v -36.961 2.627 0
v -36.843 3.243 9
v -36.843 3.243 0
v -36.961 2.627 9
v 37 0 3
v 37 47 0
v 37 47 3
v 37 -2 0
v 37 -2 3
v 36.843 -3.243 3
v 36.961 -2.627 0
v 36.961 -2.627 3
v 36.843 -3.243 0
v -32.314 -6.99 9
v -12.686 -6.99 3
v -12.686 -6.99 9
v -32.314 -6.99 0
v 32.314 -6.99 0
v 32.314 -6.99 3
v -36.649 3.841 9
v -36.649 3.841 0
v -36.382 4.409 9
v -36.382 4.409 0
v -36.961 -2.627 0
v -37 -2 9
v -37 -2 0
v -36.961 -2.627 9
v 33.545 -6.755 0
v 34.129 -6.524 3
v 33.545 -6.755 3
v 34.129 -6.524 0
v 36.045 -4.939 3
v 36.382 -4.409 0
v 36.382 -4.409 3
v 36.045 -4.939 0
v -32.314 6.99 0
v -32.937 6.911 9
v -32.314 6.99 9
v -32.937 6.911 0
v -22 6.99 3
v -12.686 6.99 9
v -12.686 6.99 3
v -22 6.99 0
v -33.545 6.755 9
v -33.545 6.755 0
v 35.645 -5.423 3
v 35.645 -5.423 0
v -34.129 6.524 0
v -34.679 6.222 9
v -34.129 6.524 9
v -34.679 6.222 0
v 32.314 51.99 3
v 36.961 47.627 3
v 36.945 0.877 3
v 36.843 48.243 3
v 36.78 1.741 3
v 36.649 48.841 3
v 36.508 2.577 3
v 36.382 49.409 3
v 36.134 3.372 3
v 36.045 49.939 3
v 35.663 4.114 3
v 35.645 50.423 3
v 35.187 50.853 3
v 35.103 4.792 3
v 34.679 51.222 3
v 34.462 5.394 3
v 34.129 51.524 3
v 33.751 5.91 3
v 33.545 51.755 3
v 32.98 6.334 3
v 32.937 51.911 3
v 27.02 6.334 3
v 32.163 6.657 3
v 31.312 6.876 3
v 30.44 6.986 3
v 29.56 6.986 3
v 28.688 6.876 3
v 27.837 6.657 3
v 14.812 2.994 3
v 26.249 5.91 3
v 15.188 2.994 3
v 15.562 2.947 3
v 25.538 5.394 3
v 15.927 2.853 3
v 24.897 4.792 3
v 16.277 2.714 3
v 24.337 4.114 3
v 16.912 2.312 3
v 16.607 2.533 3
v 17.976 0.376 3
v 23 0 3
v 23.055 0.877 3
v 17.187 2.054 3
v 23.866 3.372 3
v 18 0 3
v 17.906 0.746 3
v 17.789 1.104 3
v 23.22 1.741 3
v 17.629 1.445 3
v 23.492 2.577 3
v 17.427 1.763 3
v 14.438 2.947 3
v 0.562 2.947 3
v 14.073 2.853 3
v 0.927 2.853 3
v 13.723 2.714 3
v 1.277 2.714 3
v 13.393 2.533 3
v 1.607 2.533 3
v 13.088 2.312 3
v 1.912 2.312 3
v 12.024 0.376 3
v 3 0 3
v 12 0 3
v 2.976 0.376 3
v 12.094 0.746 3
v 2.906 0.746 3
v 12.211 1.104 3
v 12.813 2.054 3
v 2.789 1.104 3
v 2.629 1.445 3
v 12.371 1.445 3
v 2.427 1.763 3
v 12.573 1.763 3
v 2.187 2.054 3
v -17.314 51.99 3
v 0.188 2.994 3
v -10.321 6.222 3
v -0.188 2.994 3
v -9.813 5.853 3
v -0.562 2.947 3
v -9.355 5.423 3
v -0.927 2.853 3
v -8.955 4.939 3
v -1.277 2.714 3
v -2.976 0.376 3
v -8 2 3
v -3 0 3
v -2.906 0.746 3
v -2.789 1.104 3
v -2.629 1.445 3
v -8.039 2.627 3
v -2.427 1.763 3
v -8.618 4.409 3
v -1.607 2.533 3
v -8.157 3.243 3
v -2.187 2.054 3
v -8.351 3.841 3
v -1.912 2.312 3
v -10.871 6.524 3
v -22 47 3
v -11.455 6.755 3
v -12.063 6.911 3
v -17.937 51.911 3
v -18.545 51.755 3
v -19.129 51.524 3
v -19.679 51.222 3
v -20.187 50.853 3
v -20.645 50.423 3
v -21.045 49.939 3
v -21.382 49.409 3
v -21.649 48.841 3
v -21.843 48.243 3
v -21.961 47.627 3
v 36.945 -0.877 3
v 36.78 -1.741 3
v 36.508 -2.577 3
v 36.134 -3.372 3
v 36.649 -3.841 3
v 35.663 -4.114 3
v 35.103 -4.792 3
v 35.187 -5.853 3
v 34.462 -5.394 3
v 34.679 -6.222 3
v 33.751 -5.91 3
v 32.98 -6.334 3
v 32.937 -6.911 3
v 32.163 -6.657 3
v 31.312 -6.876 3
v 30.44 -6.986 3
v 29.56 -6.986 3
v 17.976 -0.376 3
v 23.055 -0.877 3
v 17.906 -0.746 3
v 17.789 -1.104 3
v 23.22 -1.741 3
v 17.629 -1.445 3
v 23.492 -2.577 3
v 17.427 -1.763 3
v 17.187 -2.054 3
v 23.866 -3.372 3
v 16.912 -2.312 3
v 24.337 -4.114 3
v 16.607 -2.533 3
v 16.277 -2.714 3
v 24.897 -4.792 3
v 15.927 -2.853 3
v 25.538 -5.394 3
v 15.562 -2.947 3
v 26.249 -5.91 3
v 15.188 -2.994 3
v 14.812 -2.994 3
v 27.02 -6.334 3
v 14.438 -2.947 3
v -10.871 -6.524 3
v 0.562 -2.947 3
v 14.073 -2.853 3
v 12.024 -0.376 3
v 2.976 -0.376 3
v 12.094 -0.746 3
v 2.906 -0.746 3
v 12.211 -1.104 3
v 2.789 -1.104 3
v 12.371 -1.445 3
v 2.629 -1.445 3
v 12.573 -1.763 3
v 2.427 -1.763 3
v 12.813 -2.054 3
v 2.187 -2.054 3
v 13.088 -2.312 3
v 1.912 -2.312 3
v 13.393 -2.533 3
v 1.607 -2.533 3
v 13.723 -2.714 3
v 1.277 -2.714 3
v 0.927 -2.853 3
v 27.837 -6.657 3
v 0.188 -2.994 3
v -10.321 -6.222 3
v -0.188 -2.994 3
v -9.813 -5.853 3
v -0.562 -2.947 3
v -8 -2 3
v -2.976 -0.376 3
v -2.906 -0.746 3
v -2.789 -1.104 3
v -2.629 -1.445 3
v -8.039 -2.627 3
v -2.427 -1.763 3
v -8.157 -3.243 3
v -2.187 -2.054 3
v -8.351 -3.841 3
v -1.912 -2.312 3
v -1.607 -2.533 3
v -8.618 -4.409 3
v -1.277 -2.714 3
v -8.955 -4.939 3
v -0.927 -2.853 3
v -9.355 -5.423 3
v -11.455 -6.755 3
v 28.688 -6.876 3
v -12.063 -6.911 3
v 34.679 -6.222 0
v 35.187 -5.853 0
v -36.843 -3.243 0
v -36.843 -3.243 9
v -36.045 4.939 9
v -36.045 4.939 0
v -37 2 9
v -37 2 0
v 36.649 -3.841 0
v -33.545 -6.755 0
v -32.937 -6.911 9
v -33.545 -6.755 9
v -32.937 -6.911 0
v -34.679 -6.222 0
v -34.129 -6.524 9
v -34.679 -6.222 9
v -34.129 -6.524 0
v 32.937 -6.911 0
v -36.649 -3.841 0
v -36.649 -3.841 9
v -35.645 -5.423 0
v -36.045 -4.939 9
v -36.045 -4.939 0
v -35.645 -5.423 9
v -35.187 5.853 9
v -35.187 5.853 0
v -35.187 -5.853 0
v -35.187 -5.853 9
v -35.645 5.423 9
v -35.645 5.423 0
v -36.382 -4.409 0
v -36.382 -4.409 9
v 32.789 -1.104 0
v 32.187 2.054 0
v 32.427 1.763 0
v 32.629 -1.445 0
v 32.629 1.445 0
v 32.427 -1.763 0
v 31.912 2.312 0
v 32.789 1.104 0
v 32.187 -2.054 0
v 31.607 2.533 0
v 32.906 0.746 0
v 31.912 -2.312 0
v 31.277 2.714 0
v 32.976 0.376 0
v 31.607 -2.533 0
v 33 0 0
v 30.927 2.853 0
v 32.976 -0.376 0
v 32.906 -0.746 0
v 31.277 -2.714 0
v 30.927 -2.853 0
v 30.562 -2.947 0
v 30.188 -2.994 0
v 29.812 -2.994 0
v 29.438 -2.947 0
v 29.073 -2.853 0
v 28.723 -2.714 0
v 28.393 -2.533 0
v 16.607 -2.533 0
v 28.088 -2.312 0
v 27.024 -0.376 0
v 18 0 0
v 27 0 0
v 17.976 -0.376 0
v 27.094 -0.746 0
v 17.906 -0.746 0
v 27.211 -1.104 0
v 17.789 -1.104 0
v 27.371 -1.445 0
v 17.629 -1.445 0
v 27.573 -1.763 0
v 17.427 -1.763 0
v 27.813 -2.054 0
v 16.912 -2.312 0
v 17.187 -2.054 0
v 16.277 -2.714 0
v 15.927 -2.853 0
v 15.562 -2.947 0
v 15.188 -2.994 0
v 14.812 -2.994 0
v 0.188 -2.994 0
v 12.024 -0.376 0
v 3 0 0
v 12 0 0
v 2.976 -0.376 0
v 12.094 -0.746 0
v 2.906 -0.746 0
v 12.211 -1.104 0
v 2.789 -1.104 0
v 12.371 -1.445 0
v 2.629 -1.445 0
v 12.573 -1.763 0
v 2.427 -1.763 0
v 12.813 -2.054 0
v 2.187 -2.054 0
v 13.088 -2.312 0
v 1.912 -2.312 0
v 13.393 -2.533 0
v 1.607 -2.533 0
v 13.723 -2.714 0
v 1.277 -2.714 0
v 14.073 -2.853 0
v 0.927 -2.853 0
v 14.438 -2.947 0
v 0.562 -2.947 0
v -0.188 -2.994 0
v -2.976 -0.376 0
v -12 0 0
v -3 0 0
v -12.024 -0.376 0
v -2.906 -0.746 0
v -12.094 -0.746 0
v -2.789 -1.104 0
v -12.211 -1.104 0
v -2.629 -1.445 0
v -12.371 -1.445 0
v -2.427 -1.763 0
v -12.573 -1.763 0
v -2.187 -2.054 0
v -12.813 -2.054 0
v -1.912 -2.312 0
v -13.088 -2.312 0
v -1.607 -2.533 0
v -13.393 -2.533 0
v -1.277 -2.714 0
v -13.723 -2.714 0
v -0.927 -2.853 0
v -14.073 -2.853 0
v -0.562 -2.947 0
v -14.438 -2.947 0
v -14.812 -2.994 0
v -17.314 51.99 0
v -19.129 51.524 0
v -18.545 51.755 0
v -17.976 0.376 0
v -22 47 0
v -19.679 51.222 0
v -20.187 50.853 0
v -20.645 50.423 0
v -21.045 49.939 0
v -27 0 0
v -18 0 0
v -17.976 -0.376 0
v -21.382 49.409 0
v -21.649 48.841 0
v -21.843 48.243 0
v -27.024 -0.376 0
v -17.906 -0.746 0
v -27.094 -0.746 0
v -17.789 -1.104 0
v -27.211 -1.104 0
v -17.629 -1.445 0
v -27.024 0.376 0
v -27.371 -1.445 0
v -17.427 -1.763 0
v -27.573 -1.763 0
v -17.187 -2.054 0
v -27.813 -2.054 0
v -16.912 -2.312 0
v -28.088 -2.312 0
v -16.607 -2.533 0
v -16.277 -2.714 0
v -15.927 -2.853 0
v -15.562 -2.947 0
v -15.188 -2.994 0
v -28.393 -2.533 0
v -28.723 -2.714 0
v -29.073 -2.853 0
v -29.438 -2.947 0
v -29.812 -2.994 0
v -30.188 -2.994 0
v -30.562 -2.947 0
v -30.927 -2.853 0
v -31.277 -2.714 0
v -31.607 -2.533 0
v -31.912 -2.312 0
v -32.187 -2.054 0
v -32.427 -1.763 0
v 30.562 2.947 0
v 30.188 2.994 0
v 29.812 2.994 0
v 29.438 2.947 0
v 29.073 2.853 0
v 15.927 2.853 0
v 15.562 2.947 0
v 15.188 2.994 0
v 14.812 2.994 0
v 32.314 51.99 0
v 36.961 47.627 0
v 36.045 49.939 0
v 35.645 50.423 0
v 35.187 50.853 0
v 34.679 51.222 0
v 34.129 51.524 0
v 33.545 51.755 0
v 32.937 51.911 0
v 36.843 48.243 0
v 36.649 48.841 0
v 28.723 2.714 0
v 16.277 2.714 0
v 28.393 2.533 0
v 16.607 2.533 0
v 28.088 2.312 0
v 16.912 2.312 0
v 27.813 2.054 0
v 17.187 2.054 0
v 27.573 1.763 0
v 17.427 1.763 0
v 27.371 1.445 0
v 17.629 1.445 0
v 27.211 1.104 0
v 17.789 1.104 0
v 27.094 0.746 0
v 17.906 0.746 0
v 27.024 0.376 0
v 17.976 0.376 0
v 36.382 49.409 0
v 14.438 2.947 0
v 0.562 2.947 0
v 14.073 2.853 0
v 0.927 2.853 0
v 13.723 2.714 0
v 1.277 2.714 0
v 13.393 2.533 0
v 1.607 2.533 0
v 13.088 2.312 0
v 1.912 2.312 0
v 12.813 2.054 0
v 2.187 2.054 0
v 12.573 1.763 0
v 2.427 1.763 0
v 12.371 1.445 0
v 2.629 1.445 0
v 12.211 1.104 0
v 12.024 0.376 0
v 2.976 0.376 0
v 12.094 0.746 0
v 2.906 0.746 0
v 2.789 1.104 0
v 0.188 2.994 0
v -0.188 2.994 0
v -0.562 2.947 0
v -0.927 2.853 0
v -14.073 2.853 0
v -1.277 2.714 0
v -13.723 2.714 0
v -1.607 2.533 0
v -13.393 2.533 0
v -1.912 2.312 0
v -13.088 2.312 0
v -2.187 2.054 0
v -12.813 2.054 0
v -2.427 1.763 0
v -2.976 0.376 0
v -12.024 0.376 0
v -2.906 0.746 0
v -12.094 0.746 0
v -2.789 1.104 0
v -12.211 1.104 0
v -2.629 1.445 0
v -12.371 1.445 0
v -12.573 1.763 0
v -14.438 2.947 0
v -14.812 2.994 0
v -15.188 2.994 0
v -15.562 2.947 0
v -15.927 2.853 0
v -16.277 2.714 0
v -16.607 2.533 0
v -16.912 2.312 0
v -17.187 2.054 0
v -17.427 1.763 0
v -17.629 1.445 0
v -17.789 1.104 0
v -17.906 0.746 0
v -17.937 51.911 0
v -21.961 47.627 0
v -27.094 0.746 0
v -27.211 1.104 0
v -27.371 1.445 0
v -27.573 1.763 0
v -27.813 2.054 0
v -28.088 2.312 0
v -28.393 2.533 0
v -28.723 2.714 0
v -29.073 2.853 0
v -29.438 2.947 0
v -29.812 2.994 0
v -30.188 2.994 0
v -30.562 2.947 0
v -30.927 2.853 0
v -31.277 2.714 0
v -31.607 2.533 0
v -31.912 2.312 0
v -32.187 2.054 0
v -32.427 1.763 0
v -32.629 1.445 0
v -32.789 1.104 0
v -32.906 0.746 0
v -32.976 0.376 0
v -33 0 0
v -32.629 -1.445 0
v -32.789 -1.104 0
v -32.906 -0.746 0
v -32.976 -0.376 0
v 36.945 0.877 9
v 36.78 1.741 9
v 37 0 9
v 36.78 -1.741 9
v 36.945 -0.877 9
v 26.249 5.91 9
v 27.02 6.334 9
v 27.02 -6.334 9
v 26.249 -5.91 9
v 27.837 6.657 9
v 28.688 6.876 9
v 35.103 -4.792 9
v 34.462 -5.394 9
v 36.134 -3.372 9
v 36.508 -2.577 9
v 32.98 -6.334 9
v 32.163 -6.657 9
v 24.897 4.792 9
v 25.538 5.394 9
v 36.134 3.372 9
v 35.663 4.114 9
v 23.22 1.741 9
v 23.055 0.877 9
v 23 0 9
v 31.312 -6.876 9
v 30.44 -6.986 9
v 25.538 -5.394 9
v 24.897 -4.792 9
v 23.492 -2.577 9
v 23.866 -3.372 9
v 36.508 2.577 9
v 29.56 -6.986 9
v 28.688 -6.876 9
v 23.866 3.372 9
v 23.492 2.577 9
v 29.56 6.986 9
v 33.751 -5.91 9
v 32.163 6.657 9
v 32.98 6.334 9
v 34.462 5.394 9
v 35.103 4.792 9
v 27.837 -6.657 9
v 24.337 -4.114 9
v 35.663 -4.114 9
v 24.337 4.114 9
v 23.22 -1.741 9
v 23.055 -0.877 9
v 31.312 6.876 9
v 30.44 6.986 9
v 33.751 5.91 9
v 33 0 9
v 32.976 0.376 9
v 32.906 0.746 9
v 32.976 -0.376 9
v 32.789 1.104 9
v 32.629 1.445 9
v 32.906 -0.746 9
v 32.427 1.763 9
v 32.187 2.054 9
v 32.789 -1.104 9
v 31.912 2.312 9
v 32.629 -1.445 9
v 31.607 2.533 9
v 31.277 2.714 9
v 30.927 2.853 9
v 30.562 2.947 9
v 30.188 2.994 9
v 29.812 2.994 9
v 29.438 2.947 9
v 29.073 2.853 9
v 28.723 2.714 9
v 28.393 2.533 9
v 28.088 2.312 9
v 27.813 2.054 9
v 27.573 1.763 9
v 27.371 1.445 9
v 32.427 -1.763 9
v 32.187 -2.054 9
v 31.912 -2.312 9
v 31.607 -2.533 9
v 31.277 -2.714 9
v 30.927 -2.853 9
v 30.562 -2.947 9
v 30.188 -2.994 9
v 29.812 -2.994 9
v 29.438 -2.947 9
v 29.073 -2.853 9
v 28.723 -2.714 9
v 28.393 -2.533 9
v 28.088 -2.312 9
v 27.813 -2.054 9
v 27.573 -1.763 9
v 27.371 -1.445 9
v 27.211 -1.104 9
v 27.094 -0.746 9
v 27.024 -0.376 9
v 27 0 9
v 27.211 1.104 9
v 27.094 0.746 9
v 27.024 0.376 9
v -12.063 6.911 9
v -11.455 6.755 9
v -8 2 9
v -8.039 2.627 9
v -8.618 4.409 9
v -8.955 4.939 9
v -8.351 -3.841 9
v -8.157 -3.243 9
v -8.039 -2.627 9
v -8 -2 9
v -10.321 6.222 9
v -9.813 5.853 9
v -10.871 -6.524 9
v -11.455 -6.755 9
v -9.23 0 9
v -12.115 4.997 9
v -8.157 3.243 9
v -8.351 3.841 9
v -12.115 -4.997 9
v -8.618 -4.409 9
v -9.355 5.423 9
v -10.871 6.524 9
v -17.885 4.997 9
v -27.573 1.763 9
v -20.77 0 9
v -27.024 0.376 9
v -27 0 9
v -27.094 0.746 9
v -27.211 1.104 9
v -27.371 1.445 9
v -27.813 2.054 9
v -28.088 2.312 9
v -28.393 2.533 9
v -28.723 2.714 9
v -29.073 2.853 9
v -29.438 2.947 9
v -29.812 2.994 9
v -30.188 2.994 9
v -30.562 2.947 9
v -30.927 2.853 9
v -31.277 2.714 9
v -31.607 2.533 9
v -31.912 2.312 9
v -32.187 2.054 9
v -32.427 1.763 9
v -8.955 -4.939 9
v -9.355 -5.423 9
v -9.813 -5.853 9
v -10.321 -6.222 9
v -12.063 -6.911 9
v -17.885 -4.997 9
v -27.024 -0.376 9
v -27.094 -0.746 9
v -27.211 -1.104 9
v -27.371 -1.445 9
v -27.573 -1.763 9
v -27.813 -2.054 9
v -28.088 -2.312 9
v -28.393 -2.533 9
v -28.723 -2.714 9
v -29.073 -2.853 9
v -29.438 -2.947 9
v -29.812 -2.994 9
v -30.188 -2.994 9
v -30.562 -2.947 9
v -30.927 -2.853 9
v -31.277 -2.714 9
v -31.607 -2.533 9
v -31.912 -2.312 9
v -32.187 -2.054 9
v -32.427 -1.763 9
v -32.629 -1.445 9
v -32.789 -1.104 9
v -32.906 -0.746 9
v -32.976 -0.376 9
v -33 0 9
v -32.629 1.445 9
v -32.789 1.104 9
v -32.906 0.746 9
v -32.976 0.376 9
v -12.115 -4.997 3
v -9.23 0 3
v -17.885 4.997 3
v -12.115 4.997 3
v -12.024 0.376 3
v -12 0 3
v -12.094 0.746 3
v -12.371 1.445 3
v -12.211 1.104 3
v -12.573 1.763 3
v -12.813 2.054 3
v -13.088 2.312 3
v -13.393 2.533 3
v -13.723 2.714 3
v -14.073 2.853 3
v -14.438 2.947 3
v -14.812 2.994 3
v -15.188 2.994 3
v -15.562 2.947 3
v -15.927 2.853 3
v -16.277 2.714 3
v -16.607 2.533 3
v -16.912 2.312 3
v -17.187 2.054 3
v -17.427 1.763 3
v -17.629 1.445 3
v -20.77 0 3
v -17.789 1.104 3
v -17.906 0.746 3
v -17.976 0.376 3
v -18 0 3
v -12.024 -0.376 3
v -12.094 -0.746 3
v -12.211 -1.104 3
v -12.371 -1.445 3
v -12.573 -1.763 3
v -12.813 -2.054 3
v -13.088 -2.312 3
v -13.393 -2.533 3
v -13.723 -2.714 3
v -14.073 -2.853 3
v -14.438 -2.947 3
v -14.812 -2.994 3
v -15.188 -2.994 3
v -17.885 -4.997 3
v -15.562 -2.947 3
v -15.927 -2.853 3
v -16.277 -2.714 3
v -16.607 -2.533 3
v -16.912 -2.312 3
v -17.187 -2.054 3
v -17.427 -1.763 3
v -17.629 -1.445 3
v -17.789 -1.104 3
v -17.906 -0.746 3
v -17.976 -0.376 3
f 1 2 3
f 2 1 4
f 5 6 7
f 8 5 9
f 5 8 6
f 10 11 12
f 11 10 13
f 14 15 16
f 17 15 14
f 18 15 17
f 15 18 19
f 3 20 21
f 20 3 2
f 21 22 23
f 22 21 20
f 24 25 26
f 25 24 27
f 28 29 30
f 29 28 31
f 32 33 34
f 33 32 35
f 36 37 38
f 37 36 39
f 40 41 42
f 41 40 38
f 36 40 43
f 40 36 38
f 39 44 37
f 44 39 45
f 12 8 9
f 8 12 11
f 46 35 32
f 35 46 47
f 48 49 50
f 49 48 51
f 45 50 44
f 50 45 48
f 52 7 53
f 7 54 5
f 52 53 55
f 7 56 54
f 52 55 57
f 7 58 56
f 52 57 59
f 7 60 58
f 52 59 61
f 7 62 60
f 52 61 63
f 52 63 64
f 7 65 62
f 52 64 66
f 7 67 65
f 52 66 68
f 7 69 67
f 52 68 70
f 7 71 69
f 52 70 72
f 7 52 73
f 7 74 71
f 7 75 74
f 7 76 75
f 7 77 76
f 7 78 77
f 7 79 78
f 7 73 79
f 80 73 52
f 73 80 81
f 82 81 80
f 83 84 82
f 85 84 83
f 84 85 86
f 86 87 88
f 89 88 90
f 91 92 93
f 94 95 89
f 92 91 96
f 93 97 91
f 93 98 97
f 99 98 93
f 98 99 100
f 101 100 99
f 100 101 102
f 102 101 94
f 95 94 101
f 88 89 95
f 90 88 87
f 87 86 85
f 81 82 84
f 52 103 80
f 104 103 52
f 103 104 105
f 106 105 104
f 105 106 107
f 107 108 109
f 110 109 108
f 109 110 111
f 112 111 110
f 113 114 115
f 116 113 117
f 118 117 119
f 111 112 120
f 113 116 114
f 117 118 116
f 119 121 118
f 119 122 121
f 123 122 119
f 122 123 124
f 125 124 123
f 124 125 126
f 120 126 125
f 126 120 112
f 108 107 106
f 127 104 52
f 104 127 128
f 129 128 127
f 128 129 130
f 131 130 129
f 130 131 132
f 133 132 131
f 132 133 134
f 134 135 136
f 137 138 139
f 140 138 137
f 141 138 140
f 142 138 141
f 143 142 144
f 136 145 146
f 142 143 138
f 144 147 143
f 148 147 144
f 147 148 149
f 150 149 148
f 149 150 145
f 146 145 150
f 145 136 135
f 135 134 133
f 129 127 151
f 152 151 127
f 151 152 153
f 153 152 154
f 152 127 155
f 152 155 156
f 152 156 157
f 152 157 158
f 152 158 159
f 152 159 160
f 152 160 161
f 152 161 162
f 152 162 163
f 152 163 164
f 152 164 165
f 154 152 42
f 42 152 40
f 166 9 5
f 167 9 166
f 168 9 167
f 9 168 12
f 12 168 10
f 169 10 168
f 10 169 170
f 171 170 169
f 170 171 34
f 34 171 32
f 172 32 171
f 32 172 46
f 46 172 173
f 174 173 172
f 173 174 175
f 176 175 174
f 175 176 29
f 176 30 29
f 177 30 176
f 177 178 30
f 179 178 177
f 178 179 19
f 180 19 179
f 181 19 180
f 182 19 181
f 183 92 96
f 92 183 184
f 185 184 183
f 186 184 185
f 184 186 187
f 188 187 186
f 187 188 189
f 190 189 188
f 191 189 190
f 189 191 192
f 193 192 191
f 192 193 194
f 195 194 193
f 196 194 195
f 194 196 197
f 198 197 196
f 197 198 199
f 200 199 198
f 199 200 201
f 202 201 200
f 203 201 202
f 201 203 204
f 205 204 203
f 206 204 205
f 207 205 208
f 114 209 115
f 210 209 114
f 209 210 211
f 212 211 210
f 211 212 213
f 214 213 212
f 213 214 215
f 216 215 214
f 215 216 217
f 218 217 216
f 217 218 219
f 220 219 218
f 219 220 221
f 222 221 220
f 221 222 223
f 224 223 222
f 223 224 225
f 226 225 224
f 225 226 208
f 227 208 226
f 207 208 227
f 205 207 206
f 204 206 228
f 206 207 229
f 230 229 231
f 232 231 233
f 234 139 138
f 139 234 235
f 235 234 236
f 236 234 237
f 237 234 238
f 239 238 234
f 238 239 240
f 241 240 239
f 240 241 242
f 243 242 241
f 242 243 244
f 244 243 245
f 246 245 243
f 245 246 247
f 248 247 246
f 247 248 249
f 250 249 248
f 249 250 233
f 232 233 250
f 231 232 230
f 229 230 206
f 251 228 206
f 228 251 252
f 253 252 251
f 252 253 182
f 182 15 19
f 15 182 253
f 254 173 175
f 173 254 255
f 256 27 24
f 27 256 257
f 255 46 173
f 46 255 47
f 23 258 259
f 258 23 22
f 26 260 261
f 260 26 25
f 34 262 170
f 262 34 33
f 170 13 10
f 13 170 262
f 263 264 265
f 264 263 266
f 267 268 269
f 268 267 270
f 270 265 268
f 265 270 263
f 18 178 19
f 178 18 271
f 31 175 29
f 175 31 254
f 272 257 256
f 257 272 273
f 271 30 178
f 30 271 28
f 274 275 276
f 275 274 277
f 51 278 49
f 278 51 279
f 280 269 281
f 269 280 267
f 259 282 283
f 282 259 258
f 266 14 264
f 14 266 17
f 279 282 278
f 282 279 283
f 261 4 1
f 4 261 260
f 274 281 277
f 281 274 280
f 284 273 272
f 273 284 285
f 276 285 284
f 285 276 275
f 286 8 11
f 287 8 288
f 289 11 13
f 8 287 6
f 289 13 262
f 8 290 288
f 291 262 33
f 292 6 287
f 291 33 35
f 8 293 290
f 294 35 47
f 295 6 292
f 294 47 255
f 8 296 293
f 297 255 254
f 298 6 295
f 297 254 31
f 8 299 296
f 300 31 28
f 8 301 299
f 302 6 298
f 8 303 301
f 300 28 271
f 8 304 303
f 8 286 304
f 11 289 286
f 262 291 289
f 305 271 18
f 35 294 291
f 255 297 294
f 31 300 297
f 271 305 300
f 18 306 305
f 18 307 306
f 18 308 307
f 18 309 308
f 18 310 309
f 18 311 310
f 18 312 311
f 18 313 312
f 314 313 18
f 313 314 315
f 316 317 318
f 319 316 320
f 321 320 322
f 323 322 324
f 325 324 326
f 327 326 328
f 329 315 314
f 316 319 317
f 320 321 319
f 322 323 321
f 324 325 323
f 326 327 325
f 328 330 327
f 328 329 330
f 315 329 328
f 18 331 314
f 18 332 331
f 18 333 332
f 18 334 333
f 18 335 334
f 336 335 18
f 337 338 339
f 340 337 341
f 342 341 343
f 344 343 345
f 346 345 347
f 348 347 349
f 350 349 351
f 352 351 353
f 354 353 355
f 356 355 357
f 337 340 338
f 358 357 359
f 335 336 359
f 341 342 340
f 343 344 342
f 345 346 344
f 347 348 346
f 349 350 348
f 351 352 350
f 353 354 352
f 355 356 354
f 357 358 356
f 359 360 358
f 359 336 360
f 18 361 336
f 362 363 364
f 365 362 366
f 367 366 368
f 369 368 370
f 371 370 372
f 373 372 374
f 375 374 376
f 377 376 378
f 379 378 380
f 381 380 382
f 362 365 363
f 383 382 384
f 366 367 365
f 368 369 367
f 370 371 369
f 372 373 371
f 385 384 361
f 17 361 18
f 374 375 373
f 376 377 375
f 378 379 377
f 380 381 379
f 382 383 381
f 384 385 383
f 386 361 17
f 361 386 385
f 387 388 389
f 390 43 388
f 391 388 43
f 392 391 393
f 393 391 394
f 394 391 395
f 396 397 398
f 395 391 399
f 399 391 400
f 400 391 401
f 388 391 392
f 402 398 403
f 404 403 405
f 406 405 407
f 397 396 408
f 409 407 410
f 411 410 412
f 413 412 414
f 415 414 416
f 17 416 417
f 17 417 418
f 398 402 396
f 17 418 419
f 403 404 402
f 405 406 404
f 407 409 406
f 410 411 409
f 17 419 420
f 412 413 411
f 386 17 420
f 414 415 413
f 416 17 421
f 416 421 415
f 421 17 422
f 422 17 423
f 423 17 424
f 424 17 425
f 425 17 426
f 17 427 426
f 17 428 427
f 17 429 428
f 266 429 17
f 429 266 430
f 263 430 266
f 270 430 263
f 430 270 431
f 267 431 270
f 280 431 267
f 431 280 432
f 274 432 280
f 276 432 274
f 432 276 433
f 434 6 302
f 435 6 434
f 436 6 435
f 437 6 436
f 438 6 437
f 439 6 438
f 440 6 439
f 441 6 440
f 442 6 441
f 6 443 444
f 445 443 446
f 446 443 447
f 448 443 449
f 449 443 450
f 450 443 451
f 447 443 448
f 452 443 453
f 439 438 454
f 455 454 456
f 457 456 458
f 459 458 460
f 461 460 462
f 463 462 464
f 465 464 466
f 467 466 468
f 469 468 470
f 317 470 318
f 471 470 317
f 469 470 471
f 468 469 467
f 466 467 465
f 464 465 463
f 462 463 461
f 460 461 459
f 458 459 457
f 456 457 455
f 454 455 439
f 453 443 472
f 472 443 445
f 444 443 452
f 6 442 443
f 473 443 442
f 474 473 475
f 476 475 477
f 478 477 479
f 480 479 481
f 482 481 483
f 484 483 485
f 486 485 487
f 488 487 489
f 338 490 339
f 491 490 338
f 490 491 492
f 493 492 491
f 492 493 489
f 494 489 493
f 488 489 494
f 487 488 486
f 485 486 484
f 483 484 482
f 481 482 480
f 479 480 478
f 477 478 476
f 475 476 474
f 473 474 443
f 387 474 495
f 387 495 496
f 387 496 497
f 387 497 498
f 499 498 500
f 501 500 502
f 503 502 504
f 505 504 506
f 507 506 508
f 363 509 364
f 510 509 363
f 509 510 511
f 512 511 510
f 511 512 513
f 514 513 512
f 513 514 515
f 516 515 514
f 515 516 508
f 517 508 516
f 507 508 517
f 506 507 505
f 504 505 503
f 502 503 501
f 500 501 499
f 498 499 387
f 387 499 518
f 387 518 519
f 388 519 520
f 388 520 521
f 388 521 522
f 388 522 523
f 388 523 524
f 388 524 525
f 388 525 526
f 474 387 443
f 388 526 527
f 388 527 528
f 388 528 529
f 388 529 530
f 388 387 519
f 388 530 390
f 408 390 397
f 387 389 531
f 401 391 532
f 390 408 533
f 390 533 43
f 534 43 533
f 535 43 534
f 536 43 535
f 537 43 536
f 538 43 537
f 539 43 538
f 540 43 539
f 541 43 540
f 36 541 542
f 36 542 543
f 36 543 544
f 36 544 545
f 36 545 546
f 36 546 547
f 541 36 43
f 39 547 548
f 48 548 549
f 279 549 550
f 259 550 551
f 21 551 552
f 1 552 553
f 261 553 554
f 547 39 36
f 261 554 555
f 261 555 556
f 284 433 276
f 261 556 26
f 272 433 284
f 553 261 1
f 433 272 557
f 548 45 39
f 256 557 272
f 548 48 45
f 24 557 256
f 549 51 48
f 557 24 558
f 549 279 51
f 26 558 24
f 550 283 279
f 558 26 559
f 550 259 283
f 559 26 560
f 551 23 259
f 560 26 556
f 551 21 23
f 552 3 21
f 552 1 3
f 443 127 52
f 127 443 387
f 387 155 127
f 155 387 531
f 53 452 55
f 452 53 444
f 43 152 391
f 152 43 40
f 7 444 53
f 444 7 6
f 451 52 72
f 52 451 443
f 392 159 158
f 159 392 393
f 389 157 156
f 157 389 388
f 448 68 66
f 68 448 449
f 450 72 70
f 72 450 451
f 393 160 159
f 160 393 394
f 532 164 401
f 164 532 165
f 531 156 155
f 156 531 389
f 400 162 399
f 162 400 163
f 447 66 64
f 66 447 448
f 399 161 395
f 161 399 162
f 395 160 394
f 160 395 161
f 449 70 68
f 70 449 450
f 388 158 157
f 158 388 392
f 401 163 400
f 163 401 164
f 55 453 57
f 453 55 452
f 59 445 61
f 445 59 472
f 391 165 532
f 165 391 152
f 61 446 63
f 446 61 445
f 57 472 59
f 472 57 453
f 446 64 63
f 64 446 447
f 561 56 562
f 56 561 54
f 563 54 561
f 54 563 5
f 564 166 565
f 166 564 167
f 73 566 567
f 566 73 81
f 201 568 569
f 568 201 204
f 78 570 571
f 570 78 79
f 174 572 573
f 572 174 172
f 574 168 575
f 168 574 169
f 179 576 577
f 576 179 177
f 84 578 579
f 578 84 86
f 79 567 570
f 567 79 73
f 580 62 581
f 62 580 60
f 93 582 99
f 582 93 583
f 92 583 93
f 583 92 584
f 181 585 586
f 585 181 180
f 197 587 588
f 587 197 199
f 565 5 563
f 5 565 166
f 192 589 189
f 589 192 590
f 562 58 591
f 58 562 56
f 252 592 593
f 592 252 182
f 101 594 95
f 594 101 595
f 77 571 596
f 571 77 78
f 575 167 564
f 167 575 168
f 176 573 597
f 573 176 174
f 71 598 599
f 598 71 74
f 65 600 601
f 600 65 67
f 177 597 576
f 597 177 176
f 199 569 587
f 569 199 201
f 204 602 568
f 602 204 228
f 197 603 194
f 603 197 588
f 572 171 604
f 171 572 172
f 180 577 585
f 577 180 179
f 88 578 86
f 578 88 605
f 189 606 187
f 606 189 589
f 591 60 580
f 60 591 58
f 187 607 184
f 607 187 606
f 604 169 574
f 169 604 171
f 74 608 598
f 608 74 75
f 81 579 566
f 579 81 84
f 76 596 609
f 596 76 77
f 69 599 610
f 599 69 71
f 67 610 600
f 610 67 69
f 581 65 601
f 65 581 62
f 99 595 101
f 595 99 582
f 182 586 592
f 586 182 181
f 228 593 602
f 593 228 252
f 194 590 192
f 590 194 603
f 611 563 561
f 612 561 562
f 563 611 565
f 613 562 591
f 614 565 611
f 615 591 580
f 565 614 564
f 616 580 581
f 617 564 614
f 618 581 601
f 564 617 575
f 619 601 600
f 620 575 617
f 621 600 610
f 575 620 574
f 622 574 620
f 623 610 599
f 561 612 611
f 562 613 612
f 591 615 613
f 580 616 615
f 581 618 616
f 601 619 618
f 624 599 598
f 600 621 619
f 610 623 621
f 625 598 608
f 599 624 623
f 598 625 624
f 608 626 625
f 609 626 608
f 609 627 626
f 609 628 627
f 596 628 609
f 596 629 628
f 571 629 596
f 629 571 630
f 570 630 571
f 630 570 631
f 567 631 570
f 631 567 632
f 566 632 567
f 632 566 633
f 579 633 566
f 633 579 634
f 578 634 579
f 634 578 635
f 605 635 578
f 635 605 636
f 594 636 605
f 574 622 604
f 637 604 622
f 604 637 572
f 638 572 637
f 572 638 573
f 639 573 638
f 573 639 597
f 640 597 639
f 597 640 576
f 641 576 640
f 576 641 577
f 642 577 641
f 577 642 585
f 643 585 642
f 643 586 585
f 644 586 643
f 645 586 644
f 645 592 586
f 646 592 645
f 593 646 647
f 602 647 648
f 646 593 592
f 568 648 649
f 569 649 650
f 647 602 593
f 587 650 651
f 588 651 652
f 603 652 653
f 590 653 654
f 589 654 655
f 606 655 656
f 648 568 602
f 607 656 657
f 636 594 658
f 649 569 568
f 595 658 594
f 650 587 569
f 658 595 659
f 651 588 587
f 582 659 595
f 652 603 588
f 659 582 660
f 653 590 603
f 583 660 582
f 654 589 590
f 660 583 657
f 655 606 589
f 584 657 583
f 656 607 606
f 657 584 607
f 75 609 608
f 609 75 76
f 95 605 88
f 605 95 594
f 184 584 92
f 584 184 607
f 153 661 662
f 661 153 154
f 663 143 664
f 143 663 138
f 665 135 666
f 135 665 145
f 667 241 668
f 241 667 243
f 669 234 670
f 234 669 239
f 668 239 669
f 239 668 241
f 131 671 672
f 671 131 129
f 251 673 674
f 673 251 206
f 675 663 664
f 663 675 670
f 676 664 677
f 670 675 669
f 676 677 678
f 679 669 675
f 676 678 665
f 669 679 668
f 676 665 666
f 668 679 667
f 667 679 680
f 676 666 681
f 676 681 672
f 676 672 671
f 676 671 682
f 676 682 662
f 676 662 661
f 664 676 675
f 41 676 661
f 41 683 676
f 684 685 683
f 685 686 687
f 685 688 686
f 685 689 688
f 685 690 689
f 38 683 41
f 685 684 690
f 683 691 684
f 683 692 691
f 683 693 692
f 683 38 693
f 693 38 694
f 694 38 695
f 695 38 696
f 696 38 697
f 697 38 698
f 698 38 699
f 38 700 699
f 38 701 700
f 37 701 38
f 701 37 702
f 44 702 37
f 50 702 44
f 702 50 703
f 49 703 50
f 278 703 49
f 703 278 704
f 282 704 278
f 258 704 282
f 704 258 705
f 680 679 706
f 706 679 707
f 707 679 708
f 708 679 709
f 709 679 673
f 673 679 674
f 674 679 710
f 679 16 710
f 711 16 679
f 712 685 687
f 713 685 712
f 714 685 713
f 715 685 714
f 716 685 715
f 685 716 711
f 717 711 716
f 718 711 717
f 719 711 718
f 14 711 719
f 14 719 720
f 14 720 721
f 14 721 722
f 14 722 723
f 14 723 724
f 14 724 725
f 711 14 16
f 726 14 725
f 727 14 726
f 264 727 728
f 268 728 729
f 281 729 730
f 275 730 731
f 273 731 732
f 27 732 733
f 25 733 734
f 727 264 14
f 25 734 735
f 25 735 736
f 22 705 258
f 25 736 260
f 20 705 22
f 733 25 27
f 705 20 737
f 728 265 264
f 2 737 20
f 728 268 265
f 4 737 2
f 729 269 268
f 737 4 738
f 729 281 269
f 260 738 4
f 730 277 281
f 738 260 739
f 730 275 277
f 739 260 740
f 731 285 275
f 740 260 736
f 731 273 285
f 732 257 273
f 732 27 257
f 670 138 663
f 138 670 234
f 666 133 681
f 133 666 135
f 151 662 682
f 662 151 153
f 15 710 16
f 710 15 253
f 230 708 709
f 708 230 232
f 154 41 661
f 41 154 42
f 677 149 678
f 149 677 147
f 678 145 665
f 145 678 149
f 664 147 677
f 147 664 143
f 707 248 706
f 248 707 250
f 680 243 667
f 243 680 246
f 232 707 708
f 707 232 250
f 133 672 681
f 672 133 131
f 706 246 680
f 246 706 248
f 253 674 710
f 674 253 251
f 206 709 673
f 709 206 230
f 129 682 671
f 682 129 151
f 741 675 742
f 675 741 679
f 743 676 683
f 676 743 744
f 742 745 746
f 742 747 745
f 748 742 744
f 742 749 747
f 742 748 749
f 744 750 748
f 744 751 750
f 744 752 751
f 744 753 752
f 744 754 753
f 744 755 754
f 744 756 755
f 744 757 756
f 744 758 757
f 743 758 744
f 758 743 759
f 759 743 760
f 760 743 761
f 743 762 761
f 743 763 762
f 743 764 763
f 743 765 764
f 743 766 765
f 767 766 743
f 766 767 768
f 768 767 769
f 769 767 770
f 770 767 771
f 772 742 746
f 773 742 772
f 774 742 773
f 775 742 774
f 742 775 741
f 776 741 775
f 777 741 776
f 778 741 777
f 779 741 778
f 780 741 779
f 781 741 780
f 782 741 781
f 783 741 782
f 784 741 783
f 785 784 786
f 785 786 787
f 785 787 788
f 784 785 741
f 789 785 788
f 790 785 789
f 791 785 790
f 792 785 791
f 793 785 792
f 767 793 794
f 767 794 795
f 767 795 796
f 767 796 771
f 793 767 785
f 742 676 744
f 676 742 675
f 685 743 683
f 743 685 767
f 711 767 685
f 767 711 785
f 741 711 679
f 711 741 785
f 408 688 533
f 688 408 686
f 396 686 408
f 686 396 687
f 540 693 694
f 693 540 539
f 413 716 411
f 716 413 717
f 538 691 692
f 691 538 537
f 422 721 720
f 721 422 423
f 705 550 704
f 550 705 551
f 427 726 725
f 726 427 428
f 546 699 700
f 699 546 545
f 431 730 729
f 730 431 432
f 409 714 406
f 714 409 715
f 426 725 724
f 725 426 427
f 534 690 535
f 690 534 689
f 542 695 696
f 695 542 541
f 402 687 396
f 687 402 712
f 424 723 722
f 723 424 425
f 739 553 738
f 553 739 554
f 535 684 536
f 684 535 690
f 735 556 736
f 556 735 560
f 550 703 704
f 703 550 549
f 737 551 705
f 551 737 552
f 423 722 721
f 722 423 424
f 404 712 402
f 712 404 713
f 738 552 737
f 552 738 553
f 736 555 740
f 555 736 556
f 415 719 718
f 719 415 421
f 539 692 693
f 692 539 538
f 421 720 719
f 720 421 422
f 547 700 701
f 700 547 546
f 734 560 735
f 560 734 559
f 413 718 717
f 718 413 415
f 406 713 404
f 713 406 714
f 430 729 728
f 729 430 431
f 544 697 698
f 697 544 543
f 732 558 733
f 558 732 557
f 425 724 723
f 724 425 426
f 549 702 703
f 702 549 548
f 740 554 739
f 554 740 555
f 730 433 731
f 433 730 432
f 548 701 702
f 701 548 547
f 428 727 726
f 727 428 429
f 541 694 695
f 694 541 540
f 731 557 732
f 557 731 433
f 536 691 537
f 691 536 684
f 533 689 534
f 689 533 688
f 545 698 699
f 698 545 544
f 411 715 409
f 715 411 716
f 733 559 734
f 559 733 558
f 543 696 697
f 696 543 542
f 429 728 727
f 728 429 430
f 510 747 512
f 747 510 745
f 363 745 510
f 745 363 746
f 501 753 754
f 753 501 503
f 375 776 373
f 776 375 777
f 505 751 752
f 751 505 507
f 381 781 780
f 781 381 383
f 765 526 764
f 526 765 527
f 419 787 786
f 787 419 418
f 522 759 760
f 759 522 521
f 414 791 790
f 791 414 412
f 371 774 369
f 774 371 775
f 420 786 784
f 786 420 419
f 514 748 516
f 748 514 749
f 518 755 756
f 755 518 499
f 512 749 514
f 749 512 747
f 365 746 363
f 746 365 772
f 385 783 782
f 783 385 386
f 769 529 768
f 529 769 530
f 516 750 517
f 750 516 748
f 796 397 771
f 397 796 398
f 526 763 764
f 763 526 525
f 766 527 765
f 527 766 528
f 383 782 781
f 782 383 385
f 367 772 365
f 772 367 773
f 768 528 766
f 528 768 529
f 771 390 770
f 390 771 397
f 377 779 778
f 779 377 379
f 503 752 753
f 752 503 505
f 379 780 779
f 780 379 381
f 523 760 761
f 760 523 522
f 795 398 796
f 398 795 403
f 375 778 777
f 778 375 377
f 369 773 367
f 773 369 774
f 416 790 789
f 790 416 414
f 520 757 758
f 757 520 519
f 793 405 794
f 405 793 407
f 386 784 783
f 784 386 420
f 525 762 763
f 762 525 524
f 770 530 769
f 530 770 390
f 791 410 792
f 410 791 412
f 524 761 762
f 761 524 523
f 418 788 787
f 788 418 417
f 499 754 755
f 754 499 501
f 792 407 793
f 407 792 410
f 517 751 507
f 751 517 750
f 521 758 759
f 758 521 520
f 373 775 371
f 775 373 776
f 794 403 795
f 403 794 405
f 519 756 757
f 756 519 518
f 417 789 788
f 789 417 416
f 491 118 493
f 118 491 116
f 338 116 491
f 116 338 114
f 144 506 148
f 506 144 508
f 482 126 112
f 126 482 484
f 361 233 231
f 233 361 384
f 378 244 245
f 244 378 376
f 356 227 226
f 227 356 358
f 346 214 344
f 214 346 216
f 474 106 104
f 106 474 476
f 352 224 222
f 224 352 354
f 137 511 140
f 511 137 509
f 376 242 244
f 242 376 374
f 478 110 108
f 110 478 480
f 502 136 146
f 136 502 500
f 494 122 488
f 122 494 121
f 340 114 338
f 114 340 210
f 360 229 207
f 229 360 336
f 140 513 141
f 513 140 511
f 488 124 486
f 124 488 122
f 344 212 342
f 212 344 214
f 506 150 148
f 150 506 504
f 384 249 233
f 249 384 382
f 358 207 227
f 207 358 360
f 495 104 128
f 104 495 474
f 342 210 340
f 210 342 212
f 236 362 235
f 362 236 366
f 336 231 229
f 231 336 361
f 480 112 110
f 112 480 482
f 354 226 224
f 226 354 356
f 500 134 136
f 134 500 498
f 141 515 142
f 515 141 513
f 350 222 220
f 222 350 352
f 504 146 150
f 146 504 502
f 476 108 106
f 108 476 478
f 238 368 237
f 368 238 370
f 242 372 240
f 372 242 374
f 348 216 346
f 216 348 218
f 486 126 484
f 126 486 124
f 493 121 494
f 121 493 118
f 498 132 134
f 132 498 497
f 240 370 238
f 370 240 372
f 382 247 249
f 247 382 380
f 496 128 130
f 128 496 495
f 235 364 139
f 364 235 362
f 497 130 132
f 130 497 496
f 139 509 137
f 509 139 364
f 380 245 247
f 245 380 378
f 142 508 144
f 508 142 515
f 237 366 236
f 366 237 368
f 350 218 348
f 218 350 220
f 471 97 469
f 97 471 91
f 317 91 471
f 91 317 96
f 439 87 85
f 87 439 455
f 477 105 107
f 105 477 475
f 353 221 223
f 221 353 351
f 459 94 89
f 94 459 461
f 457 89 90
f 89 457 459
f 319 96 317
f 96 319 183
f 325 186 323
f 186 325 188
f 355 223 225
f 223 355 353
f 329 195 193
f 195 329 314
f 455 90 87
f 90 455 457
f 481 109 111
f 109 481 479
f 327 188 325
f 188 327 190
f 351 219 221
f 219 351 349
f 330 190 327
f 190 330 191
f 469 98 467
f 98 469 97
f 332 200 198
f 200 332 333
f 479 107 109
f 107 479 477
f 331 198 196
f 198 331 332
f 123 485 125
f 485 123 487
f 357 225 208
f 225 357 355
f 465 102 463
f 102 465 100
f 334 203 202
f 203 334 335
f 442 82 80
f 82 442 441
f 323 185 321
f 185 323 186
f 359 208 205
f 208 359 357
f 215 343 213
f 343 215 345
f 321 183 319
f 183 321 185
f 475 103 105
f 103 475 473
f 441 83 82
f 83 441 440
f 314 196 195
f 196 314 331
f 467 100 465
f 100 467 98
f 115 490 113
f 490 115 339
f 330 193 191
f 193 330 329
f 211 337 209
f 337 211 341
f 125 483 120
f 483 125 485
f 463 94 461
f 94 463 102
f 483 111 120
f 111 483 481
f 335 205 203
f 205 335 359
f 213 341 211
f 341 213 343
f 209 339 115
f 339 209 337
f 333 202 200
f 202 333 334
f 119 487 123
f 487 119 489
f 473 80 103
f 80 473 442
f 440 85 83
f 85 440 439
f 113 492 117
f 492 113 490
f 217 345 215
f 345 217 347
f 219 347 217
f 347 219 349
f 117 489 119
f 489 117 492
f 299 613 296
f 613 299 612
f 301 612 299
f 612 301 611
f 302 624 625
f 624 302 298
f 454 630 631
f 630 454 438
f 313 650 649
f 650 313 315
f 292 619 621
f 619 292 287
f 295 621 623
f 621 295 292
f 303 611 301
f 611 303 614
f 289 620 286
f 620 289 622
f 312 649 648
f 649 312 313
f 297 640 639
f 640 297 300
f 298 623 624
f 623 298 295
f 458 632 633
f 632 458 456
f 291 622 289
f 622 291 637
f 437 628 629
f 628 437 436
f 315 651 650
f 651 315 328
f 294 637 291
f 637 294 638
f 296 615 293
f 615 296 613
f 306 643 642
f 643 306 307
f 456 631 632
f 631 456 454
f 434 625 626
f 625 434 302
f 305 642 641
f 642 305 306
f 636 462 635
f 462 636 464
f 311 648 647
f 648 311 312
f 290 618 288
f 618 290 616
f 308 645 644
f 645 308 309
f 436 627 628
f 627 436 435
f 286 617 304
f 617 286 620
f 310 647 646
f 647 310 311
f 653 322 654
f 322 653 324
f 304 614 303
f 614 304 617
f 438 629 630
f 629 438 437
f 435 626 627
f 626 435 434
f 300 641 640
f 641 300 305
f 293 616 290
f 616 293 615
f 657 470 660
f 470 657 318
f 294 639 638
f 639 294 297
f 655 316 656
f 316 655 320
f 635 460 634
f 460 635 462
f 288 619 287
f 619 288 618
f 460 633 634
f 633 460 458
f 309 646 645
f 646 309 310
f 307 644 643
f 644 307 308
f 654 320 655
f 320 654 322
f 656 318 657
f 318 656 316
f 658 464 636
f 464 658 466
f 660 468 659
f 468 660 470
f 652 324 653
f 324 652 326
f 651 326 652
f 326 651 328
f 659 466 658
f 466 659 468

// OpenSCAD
$fn = 50;


difference() {
	union() {
		hull() {
			translate(v = [-32.0000000000, 2.0000000000, 0]) {
				cylinder(h = 3, r = 5);
			}
			translate(v = [32.0000000000, 2.0000000000, 0]) {
				cylinder(h = 3, r = 5);
			}
			translate(v = [-32.0000000000, -2.0000000000, 0]) {
				cylinder(h = 3, r = 5);
			}
			translate(v = [32.0000000000, -2.0000000000, 0]) {
				cylinder(h = 3, r = 5);
			}
		}
		translate(v = [7.5000000000, 22.5000000000, 0]) {
			hull() {
				translate(v = [-24.5000000000, 24.5000000000, 0]) {
					cylinder(h = 3, r = 5);
				}
				translate(v = [24.5000000000, 24.5000000000, 0]) {
					cylinder(h = 3, r = 5);
				}
				translate(v = [-24.5000000000, -24.5000000000, 0]) {
					cylinder(h = 3, r = 5);
				}
				translate(v = [24.5000000000, -24.5000000000, 0]) {
					cylinder(h = 3, r = 5);
				}
			}
		}
		translate(v = [30.0000000000, 0, 0]) {
			cylinder(h = 9, r = 7.0000000000);
		}
		translate(v = [-22.5000000000, 0, 0]) {
			hull() {
				translate(v = [-9.5000000000, 2.0000000000, 0]) {
					cylinder(h = 9, r = 5);
				}
				translate(v = [9.5000000000, 2.0000000000, 0]) {
					cylinder(h = 9, r = 5);
				}
				translate(v = [-9.5000000000, -2.0000000000, 0]) {
					cylinder(h = 9, r = 5);
				}
				translate(v = [9.5000000000, -2.0000000000, 0]) {
					cylinder(h = 9, r = 5);
				}
			}
		}
	}
	union() {
		translate(v = [-15.0000000000, 0, 9]) {
			rotate(a = [0, 0, 0]) {
				difference() {
					union() {
						translate(v = [0, 0, -6]) {
							linear_extrude(height = 6) {
								polygon(points = [[5.7700000000, 0.0000000000], [2.8850000000, 4.9969665798], [-2.8850000000, 4.9969665798], [-5.7700000000, 0.0000000000], [-2.8850000000, -4.9969665798], [2.8850000000, -4.9969665798]]);
							}
						}
					}
					union();
				}
			}
		}
		translate(v = [-30.0000000000, 0.0000000000, 0]) {
			translate(v = [0, 0, -100]) {
				cylinder(h = 200, r = 3.0000000000);
			}
		}
		translate(v = [-15.0000000000, 0.0000000000, 0]) {
			translate(v = [0, 0, -100]) {
				cylinder(h = 200, r = 3.0000000000);
			}
		}
		translate(v = [0, 0, -100]) {
			cylinder(h = 200, r = 3.0000000000);
		}
		translate(v = [15.0000000000, 0.0000000000, 0]) {
			translate(v = [0, 0, -100]) {
				cylinder(h = 200, r = 3.0000000000);
			}
		}
		translate(v = [30.0000000000, 0.0000000000, 0]) {
			translate(v = [0, 0, -100]) {
				cylinder(h = 200, r = 3.0000000000);
			}
		}
	}
}
